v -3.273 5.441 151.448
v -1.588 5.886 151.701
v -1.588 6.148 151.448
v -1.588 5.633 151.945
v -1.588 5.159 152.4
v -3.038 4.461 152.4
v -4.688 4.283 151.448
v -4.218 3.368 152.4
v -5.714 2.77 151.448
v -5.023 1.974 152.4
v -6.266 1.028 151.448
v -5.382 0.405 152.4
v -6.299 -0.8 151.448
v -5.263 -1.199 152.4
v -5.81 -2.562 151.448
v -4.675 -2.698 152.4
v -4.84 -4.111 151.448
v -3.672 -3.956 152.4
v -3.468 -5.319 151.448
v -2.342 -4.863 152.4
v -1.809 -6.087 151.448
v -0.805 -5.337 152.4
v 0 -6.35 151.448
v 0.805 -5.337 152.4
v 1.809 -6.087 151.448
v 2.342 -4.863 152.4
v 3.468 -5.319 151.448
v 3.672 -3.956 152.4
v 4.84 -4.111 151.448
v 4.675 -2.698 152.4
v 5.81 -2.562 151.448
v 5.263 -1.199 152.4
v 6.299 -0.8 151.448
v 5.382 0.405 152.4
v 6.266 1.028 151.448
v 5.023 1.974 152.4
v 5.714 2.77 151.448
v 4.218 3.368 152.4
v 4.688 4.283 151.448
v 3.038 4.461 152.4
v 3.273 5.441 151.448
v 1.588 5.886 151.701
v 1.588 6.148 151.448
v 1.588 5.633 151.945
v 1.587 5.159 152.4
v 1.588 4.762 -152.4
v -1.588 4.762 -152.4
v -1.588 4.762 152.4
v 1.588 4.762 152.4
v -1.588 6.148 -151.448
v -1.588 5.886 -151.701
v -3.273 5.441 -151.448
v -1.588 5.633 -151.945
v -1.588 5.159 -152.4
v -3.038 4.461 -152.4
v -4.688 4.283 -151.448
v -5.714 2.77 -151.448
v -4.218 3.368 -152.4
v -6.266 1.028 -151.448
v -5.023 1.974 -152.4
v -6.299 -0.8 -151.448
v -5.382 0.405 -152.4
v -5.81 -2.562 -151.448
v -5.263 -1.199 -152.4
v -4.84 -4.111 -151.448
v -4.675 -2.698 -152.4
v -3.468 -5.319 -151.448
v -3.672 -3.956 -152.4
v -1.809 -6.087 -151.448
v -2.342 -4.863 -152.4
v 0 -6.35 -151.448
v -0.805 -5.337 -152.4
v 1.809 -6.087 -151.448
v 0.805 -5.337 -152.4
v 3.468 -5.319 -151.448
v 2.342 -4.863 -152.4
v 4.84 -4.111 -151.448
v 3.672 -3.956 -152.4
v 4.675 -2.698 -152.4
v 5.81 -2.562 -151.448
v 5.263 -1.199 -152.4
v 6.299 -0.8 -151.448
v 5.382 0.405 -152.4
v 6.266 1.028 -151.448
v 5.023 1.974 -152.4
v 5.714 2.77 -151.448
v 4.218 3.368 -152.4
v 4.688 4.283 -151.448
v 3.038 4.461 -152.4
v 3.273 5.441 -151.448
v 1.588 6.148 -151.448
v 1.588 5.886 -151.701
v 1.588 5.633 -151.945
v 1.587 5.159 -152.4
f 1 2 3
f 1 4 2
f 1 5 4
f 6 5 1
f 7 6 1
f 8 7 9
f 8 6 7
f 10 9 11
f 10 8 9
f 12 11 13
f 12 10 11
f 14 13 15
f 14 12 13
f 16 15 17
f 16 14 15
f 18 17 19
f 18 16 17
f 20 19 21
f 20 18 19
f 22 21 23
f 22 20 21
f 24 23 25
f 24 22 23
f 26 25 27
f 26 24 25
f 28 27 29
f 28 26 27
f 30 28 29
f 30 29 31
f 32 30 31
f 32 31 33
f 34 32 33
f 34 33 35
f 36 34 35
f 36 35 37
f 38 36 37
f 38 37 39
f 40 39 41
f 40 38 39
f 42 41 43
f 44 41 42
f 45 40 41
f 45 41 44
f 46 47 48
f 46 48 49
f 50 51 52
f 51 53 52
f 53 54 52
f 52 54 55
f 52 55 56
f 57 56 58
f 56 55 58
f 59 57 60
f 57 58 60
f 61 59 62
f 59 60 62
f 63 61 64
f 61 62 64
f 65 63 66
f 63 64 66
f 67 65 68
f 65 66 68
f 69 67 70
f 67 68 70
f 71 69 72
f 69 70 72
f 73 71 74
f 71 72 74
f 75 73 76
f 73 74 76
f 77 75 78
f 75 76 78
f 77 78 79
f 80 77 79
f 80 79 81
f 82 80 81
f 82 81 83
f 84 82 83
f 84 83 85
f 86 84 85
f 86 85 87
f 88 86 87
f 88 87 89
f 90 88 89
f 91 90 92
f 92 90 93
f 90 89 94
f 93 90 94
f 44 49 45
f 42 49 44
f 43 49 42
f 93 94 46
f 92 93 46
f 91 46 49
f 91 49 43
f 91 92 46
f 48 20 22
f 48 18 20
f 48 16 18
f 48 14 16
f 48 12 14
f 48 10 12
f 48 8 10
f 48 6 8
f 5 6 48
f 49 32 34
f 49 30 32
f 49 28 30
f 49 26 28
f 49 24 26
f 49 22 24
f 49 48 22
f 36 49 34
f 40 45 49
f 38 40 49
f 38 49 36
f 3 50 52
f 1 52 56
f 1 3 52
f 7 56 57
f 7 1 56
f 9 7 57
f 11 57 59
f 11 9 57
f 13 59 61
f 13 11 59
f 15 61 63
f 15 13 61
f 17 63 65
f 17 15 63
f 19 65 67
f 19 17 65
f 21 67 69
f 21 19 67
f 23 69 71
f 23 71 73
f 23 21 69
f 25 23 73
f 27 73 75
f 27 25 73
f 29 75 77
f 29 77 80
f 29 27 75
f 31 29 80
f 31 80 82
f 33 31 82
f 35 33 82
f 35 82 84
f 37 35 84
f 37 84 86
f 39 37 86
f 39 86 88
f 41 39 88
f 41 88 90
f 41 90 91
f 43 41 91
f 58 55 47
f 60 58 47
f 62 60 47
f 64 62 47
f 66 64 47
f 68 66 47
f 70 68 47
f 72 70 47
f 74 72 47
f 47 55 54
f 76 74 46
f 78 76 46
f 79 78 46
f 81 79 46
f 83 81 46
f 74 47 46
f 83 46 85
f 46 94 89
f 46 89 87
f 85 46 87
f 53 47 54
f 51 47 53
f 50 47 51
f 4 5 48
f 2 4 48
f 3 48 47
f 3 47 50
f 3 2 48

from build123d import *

# Parameters (mm, degrees)
SKETCH1_R           = 6.35
EXTRUDE1_DEPTH      = 152.4
CHAMFER1_SIZE       = 0.9525
SKETCH3_W           = 3.175
SKETCH3_H           = 1.5875
EXTRUDE2_DEPTH      = 153.4
EXTRUDE2_DEPTH_BACK = 153.4


with BuildPart() as part:
    # Sketch1 → Extrude1 (new body, symmetric)
    with BuildSketch(Plane.XY):
        Circle(SKETCH1_R)
    extrude(amount=EXTRUDE1_DEPTH, both=True)

    # Chamfer1
    chamfer1_edges = [part.edges().sort_by_distance(p)[0] for p in [
        (-6.35, 0, -152.4),
        (-6.35, 0, 152.4),
    ]]
    chamfer(chamfer1_edges, length=CHAMFER1_SIZE)

    # Sketch3 → Extrude2 (cut, two sides)
    with BuildSketch(Plane.XY) as extrude2_sk:
        with Locations((0, 5.55625)):
            Rectangle(SKETCH3_W, SKETCH3_H)
    extrude(amount=EXTRUDE2_DEPTH, mode=Mode.SUBTRACT)
    extrude(extrude2_sk.sketch, amount=-EXTRUDE2_DEPTH_BACK, mode=Mode.SUBTRACT)


solid = part.part
